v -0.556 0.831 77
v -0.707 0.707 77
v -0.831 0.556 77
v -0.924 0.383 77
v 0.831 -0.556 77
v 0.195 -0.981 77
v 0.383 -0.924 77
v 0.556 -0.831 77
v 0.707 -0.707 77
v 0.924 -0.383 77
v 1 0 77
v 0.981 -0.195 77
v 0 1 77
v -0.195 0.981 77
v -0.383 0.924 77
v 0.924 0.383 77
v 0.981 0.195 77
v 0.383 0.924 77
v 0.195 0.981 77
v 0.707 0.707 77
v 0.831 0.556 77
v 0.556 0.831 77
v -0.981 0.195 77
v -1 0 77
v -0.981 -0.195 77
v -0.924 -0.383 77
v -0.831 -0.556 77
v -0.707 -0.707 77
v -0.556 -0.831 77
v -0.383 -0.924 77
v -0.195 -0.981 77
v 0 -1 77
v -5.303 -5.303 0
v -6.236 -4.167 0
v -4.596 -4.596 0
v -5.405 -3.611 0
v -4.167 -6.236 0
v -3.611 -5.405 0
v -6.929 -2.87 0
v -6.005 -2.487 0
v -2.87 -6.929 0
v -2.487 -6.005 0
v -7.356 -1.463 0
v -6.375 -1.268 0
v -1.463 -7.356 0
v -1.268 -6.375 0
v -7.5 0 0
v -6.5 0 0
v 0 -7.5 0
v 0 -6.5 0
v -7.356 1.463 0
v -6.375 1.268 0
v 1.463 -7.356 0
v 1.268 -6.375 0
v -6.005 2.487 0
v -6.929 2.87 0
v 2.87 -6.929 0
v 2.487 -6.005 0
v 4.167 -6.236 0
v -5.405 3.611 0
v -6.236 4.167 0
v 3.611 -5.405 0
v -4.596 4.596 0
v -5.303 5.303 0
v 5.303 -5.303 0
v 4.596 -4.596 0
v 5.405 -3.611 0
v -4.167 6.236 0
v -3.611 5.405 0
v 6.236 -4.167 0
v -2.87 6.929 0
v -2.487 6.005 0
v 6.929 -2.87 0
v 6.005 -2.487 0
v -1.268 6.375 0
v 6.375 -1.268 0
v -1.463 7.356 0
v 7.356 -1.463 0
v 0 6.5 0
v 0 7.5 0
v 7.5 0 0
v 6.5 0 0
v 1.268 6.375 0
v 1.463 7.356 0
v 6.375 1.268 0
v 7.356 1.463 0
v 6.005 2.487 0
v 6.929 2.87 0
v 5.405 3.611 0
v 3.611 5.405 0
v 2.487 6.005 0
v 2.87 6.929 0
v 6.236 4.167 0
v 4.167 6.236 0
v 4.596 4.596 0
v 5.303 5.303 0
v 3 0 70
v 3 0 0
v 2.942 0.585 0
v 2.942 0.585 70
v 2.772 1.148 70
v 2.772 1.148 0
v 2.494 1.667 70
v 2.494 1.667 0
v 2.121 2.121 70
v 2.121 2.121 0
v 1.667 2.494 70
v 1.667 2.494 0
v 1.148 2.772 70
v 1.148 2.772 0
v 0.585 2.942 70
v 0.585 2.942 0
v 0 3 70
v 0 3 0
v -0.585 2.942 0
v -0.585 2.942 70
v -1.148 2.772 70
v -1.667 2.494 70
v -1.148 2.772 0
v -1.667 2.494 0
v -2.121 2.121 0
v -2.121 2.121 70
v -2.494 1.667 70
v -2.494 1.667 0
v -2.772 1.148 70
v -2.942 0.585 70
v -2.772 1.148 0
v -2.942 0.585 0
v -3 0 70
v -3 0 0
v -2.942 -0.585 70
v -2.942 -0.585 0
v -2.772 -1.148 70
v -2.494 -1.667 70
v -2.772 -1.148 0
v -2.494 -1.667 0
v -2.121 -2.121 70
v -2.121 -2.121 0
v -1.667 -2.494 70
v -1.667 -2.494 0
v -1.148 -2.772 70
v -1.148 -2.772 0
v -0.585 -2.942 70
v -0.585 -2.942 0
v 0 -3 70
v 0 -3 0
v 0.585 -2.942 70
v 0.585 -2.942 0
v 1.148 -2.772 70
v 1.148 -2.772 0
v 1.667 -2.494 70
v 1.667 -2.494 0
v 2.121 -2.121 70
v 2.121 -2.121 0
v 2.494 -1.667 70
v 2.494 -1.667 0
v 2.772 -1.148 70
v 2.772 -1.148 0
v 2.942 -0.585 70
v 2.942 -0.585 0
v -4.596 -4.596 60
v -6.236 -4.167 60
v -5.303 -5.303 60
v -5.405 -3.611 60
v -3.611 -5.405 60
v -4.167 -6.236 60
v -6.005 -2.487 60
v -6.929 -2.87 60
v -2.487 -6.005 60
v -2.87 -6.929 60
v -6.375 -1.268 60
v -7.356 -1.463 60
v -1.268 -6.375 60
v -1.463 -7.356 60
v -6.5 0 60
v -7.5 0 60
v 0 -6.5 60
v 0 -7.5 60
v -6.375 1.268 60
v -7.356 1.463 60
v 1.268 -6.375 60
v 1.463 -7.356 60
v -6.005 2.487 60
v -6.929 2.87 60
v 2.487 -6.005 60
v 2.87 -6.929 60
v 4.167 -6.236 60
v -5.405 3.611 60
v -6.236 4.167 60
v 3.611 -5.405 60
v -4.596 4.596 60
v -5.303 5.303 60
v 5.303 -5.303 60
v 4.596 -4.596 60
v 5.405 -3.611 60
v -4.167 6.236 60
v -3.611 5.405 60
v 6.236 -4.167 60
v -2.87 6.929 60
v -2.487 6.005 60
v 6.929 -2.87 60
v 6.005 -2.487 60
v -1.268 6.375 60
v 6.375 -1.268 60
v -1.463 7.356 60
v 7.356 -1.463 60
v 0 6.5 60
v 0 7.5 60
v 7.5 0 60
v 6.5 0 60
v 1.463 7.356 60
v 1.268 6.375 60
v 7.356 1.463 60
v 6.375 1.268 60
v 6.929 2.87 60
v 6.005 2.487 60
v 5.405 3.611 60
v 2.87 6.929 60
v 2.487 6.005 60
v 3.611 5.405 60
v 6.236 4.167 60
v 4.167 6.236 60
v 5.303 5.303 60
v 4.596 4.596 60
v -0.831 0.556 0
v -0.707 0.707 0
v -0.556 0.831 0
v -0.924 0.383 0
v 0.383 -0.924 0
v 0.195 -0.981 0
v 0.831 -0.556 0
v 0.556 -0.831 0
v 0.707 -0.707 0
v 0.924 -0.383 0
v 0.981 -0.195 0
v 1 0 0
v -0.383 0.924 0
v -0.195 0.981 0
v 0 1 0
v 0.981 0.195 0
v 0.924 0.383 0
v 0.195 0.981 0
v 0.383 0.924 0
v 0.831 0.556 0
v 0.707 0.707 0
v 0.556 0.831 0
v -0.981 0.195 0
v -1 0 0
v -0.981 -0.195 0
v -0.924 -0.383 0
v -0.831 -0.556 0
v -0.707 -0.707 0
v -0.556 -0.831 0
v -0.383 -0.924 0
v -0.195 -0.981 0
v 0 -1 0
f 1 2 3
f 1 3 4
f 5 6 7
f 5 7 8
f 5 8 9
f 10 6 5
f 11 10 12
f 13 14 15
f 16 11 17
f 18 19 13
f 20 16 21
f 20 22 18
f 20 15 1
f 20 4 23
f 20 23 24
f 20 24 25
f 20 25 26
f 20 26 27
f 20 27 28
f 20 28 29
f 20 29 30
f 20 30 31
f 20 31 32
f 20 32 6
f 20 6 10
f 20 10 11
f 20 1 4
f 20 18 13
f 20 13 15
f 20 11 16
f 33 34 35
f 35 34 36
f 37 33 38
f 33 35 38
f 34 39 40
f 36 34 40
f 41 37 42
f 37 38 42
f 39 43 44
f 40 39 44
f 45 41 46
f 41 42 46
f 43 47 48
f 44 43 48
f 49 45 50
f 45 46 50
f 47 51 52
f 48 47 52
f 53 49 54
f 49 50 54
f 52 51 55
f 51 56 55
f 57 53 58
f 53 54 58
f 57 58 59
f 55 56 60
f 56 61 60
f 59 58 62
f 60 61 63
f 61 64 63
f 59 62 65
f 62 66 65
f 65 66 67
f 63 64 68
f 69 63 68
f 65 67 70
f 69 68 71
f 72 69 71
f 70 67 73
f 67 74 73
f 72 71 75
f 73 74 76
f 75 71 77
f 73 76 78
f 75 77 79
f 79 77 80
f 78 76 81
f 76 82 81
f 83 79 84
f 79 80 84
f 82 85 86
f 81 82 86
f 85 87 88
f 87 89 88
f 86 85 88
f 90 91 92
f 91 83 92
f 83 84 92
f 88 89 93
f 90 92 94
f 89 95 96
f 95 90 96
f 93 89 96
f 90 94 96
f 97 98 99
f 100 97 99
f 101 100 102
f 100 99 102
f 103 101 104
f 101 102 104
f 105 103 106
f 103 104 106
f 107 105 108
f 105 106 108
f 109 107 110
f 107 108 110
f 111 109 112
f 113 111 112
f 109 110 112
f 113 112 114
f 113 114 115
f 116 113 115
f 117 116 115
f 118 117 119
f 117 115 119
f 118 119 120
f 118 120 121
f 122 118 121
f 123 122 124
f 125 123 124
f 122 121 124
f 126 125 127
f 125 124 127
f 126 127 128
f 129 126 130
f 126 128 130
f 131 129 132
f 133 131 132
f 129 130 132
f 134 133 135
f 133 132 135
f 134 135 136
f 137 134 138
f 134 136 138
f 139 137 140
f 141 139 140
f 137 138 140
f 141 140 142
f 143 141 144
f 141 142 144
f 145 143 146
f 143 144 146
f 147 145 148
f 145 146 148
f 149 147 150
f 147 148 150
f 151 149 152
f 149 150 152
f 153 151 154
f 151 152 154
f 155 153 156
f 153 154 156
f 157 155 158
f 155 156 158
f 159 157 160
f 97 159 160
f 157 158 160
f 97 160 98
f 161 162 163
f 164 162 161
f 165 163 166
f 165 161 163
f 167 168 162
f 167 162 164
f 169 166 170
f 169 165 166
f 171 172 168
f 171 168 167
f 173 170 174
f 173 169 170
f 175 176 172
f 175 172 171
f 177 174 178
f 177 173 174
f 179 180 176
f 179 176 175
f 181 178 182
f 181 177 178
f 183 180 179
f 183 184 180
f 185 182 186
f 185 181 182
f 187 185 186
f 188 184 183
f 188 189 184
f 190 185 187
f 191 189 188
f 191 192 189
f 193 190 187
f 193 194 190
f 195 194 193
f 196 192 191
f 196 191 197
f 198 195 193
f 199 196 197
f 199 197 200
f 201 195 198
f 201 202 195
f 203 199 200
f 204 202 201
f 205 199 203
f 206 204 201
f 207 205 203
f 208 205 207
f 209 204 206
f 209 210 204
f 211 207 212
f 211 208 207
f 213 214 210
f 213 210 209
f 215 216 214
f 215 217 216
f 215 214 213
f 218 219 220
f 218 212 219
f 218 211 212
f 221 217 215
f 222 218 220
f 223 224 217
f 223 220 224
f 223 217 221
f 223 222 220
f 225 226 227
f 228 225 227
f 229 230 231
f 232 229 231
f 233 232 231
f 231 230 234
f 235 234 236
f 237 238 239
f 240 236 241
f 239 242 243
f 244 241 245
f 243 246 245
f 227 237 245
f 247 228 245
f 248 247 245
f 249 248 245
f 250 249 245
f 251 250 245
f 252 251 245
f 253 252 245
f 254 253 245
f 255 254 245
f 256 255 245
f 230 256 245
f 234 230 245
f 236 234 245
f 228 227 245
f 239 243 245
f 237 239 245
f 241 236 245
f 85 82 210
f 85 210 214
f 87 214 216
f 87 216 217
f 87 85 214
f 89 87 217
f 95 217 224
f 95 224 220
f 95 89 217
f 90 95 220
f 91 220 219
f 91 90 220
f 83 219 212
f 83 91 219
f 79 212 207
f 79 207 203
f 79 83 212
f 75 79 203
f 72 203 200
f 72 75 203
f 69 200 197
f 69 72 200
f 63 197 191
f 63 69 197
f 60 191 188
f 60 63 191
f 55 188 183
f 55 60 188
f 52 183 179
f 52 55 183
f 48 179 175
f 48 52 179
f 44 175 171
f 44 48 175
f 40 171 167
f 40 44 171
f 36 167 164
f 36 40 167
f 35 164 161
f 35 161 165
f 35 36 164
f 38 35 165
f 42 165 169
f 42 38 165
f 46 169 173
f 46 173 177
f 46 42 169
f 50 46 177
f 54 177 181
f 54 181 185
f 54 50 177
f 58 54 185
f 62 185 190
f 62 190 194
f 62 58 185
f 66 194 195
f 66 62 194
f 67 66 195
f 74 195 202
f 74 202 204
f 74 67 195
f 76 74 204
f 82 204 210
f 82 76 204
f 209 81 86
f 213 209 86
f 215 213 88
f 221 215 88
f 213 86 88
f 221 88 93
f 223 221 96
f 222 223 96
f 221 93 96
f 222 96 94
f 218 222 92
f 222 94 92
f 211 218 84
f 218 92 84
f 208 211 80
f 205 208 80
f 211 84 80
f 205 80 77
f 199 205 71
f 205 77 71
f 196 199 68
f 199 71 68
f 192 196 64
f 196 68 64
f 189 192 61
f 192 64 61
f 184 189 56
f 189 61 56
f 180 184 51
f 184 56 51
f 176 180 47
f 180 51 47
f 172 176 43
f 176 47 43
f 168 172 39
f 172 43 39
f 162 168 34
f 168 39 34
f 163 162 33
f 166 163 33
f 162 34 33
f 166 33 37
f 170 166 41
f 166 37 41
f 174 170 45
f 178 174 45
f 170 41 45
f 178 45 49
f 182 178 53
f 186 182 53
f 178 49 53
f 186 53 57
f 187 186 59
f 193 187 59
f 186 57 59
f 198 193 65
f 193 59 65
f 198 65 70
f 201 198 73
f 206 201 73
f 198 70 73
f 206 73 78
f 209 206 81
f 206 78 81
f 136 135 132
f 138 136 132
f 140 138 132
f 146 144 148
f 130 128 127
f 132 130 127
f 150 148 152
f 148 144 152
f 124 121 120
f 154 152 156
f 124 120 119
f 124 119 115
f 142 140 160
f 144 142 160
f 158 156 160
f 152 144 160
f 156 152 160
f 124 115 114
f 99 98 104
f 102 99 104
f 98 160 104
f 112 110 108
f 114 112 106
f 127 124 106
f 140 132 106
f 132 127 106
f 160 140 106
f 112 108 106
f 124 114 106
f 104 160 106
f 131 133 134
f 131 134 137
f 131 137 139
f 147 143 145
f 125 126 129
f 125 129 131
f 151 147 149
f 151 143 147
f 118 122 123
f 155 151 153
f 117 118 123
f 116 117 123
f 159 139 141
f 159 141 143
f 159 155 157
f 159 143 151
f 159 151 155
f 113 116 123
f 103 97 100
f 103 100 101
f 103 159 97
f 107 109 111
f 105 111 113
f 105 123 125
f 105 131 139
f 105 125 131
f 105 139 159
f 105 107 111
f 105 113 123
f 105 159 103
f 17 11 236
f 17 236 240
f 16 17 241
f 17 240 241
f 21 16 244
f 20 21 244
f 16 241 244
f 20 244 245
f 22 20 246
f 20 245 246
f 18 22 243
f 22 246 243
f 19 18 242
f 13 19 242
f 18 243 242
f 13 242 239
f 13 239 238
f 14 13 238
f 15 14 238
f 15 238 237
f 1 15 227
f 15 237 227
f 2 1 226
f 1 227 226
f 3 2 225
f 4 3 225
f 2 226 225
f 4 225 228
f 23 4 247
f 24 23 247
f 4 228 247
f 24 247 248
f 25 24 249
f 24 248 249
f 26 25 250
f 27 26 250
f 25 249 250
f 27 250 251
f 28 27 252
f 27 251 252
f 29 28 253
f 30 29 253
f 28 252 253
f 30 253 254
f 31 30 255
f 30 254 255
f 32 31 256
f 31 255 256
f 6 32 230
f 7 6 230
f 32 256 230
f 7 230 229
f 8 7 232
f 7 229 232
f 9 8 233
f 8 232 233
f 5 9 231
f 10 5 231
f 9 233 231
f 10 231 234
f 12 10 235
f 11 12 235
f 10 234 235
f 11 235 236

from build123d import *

# Parameters (mm, degrees)
F0_R     = 7.5
F0_R_2   = 6.5
F1_DEPTH = 60
F0_R_3   = 1
F2_DEPTH = 77
F3_R     = 3
F4_DEPTH = 70


with BuildPart() as f1:
    # F0 (on Top) → F1 (new body)
    with BuildSketch(Plane.XY):
        Circle(F0_R)
        Circle(F0_R_2, mode=Mode.SUBTRACT)
    extrude(amount=F1_DEPTH)


with BuildPart() as f2:
    # F0 (on Top) → F2 (new body)
    with BuildSketch(Plane.XY):
        Circle(F0_R_3)
    extrude(amount=F2_DEPTH)


with BuildPart() as f4:
    # F3 (on Top) → F4 (new body)
    with BuildSketch(Plane.XY):
        Circle(F3_R)
    extrude(amount=F4_DEPTH)


solid = Compound([f1.part, f2.part, f4.part])
